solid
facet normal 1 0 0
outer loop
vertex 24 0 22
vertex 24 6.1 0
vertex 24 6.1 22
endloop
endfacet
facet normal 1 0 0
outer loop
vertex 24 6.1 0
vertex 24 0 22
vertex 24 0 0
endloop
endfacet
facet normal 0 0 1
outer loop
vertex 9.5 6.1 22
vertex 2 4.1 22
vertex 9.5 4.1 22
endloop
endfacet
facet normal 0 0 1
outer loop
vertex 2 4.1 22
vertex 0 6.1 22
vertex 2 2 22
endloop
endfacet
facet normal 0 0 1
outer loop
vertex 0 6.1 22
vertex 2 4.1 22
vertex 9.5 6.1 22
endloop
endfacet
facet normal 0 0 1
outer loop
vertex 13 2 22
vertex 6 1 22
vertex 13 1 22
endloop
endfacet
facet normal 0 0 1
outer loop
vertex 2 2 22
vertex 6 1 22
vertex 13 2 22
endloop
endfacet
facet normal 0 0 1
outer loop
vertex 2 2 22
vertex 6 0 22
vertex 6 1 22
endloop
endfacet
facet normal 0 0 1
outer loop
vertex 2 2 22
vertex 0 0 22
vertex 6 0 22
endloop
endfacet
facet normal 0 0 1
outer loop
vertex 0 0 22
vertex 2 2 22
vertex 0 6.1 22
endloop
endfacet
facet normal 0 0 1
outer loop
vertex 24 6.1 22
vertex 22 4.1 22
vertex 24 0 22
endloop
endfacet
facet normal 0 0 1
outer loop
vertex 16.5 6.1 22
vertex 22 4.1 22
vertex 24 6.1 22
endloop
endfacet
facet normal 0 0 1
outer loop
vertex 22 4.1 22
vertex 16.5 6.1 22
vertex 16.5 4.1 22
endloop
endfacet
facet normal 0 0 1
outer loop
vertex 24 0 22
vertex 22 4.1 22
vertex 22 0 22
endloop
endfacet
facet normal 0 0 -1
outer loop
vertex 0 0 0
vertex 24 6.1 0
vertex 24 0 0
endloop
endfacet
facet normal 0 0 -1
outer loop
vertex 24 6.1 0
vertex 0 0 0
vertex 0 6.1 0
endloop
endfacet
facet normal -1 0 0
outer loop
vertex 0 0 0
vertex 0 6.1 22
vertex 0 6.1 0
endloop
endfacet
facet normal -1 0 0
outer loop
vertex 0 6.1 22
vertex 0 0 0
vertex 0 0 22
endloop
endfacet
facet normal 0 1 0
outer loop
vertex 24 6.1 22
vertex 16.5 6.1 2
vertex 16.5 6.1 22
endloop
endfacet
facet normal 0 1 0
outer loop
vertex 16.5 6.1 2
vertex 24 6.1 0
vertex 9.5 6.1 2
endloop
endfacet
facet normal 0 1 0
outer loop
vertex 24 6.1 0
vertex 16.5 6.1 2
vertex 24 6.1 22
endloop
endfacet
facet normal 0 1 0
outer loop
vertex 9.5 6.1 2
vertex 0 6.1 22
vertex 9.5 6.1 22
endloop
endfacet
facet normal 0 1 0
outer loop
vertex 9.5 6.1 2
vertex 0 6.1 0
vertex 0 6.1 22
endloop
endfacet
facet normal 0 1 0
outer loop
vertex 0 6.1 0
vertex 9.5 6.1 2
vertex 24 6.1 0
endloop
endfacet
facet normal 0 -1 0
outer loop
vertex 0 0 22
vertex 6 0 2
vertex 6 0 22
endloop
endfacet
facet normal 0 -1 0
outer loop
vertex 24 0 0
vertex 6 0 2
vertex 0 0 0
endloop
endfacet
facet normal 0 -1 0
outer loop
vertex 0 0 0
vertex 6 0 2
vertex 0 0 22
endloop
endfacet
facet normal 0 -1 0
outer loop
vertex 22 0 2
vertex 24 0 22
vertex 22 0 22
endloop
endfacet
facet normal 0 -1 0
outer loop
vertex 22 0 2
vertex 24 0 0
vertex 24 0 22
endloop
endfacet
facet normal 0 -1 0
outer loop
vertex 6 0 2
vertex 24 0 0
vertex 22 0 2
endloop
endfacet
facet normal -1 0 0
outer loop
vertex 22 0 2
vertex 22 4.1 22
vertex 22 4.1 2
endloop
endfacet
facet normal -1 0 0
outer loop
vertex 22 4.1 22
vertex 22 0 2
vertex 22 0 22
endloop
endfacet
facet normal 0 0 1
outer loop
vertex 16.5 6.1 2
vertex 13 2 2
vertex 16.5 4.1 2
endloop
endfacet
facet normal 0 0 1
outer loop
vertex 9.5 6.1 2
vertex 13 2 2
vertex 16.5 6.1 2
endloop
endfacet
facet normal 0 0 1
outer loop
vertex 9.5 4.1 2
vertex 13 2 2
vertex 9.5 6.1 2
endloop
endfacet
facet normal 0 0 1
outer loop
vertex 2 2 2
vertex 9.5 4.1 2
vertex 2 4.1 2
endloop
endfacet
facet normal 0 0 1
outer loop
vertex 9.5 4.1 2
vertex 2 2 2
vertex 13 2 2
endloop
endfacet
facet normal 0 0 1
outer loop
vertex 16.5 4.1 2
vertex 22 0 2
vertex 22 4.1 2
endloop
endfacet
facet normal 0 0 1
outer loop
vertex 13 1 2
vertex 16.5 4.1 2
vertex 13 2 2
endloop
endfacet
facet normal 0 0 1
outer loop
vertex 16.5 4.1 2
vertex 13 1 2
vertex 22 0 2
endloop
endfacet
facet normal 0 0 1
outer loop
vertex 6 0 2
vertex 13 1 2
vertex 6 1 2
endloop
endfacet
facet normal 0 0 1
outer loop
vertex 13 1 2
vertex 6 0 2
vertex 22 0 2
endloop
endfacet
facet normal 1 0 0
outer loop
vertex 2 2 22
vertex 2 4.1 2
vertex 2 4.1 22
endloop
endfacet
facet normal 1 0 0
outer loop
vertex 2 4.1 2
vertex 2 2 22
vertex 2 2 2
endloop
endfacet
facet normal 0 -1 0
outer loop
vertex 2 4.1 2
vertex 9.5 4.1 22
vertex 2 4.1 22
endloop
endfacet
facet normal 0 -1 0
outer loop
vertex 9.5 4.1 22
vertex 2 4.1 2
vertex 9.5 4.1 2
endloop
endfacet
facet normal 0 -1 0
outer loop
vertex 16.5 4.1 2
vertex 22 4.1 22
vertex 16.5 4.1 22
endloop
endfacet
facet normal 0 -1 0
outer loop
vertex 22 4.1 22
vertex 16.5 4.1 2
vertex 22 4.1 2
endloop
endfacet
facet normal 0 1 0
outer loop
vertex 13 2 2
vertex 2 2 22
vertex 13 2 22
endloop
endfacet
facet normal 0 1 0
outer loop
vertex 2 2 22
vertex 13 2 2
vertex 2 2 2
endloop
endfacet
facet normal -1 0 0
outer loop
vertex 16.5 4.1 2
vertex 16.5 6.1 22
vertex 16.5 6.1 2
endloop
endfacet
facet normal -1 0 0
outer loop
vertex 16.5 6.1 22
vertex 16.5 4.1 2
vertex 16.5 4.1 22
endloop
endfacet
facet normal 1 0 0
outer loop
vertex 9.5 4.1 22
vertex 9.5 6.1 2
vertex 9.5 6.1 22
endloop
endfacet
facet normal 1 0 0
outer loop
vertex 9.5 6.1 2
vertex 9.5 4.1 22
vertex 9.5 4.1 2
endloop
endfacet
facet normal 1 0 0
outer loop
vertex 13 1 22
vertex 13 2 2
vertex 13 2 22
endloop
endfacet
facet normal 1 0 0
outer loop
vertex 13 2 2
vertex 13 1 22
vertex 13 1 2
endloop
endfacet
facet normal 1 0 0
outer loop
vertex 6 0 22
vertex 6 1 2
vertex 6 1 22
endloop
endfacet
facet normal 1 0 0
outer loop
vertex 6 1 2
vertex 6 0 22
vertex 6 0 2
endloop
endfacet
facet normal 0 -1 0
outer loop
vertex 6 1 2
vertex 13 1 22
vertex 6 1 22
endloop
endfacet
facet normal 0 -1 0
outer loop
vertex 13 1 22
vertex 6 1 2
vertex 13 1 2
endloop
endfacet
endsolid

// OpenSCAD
difference () {
cube ([24,6.1,22]);
    translate ([2,2,2])
    cube ([20,2.1,20]);
    translate ([9.5,4,2])
    cube ([7,2.2,20]);
    translate ([13,0,2])
    cube ([9,2.2,20]);
        translate ([13-7,0,2])
    cube ([9,1,20]);
    
}
